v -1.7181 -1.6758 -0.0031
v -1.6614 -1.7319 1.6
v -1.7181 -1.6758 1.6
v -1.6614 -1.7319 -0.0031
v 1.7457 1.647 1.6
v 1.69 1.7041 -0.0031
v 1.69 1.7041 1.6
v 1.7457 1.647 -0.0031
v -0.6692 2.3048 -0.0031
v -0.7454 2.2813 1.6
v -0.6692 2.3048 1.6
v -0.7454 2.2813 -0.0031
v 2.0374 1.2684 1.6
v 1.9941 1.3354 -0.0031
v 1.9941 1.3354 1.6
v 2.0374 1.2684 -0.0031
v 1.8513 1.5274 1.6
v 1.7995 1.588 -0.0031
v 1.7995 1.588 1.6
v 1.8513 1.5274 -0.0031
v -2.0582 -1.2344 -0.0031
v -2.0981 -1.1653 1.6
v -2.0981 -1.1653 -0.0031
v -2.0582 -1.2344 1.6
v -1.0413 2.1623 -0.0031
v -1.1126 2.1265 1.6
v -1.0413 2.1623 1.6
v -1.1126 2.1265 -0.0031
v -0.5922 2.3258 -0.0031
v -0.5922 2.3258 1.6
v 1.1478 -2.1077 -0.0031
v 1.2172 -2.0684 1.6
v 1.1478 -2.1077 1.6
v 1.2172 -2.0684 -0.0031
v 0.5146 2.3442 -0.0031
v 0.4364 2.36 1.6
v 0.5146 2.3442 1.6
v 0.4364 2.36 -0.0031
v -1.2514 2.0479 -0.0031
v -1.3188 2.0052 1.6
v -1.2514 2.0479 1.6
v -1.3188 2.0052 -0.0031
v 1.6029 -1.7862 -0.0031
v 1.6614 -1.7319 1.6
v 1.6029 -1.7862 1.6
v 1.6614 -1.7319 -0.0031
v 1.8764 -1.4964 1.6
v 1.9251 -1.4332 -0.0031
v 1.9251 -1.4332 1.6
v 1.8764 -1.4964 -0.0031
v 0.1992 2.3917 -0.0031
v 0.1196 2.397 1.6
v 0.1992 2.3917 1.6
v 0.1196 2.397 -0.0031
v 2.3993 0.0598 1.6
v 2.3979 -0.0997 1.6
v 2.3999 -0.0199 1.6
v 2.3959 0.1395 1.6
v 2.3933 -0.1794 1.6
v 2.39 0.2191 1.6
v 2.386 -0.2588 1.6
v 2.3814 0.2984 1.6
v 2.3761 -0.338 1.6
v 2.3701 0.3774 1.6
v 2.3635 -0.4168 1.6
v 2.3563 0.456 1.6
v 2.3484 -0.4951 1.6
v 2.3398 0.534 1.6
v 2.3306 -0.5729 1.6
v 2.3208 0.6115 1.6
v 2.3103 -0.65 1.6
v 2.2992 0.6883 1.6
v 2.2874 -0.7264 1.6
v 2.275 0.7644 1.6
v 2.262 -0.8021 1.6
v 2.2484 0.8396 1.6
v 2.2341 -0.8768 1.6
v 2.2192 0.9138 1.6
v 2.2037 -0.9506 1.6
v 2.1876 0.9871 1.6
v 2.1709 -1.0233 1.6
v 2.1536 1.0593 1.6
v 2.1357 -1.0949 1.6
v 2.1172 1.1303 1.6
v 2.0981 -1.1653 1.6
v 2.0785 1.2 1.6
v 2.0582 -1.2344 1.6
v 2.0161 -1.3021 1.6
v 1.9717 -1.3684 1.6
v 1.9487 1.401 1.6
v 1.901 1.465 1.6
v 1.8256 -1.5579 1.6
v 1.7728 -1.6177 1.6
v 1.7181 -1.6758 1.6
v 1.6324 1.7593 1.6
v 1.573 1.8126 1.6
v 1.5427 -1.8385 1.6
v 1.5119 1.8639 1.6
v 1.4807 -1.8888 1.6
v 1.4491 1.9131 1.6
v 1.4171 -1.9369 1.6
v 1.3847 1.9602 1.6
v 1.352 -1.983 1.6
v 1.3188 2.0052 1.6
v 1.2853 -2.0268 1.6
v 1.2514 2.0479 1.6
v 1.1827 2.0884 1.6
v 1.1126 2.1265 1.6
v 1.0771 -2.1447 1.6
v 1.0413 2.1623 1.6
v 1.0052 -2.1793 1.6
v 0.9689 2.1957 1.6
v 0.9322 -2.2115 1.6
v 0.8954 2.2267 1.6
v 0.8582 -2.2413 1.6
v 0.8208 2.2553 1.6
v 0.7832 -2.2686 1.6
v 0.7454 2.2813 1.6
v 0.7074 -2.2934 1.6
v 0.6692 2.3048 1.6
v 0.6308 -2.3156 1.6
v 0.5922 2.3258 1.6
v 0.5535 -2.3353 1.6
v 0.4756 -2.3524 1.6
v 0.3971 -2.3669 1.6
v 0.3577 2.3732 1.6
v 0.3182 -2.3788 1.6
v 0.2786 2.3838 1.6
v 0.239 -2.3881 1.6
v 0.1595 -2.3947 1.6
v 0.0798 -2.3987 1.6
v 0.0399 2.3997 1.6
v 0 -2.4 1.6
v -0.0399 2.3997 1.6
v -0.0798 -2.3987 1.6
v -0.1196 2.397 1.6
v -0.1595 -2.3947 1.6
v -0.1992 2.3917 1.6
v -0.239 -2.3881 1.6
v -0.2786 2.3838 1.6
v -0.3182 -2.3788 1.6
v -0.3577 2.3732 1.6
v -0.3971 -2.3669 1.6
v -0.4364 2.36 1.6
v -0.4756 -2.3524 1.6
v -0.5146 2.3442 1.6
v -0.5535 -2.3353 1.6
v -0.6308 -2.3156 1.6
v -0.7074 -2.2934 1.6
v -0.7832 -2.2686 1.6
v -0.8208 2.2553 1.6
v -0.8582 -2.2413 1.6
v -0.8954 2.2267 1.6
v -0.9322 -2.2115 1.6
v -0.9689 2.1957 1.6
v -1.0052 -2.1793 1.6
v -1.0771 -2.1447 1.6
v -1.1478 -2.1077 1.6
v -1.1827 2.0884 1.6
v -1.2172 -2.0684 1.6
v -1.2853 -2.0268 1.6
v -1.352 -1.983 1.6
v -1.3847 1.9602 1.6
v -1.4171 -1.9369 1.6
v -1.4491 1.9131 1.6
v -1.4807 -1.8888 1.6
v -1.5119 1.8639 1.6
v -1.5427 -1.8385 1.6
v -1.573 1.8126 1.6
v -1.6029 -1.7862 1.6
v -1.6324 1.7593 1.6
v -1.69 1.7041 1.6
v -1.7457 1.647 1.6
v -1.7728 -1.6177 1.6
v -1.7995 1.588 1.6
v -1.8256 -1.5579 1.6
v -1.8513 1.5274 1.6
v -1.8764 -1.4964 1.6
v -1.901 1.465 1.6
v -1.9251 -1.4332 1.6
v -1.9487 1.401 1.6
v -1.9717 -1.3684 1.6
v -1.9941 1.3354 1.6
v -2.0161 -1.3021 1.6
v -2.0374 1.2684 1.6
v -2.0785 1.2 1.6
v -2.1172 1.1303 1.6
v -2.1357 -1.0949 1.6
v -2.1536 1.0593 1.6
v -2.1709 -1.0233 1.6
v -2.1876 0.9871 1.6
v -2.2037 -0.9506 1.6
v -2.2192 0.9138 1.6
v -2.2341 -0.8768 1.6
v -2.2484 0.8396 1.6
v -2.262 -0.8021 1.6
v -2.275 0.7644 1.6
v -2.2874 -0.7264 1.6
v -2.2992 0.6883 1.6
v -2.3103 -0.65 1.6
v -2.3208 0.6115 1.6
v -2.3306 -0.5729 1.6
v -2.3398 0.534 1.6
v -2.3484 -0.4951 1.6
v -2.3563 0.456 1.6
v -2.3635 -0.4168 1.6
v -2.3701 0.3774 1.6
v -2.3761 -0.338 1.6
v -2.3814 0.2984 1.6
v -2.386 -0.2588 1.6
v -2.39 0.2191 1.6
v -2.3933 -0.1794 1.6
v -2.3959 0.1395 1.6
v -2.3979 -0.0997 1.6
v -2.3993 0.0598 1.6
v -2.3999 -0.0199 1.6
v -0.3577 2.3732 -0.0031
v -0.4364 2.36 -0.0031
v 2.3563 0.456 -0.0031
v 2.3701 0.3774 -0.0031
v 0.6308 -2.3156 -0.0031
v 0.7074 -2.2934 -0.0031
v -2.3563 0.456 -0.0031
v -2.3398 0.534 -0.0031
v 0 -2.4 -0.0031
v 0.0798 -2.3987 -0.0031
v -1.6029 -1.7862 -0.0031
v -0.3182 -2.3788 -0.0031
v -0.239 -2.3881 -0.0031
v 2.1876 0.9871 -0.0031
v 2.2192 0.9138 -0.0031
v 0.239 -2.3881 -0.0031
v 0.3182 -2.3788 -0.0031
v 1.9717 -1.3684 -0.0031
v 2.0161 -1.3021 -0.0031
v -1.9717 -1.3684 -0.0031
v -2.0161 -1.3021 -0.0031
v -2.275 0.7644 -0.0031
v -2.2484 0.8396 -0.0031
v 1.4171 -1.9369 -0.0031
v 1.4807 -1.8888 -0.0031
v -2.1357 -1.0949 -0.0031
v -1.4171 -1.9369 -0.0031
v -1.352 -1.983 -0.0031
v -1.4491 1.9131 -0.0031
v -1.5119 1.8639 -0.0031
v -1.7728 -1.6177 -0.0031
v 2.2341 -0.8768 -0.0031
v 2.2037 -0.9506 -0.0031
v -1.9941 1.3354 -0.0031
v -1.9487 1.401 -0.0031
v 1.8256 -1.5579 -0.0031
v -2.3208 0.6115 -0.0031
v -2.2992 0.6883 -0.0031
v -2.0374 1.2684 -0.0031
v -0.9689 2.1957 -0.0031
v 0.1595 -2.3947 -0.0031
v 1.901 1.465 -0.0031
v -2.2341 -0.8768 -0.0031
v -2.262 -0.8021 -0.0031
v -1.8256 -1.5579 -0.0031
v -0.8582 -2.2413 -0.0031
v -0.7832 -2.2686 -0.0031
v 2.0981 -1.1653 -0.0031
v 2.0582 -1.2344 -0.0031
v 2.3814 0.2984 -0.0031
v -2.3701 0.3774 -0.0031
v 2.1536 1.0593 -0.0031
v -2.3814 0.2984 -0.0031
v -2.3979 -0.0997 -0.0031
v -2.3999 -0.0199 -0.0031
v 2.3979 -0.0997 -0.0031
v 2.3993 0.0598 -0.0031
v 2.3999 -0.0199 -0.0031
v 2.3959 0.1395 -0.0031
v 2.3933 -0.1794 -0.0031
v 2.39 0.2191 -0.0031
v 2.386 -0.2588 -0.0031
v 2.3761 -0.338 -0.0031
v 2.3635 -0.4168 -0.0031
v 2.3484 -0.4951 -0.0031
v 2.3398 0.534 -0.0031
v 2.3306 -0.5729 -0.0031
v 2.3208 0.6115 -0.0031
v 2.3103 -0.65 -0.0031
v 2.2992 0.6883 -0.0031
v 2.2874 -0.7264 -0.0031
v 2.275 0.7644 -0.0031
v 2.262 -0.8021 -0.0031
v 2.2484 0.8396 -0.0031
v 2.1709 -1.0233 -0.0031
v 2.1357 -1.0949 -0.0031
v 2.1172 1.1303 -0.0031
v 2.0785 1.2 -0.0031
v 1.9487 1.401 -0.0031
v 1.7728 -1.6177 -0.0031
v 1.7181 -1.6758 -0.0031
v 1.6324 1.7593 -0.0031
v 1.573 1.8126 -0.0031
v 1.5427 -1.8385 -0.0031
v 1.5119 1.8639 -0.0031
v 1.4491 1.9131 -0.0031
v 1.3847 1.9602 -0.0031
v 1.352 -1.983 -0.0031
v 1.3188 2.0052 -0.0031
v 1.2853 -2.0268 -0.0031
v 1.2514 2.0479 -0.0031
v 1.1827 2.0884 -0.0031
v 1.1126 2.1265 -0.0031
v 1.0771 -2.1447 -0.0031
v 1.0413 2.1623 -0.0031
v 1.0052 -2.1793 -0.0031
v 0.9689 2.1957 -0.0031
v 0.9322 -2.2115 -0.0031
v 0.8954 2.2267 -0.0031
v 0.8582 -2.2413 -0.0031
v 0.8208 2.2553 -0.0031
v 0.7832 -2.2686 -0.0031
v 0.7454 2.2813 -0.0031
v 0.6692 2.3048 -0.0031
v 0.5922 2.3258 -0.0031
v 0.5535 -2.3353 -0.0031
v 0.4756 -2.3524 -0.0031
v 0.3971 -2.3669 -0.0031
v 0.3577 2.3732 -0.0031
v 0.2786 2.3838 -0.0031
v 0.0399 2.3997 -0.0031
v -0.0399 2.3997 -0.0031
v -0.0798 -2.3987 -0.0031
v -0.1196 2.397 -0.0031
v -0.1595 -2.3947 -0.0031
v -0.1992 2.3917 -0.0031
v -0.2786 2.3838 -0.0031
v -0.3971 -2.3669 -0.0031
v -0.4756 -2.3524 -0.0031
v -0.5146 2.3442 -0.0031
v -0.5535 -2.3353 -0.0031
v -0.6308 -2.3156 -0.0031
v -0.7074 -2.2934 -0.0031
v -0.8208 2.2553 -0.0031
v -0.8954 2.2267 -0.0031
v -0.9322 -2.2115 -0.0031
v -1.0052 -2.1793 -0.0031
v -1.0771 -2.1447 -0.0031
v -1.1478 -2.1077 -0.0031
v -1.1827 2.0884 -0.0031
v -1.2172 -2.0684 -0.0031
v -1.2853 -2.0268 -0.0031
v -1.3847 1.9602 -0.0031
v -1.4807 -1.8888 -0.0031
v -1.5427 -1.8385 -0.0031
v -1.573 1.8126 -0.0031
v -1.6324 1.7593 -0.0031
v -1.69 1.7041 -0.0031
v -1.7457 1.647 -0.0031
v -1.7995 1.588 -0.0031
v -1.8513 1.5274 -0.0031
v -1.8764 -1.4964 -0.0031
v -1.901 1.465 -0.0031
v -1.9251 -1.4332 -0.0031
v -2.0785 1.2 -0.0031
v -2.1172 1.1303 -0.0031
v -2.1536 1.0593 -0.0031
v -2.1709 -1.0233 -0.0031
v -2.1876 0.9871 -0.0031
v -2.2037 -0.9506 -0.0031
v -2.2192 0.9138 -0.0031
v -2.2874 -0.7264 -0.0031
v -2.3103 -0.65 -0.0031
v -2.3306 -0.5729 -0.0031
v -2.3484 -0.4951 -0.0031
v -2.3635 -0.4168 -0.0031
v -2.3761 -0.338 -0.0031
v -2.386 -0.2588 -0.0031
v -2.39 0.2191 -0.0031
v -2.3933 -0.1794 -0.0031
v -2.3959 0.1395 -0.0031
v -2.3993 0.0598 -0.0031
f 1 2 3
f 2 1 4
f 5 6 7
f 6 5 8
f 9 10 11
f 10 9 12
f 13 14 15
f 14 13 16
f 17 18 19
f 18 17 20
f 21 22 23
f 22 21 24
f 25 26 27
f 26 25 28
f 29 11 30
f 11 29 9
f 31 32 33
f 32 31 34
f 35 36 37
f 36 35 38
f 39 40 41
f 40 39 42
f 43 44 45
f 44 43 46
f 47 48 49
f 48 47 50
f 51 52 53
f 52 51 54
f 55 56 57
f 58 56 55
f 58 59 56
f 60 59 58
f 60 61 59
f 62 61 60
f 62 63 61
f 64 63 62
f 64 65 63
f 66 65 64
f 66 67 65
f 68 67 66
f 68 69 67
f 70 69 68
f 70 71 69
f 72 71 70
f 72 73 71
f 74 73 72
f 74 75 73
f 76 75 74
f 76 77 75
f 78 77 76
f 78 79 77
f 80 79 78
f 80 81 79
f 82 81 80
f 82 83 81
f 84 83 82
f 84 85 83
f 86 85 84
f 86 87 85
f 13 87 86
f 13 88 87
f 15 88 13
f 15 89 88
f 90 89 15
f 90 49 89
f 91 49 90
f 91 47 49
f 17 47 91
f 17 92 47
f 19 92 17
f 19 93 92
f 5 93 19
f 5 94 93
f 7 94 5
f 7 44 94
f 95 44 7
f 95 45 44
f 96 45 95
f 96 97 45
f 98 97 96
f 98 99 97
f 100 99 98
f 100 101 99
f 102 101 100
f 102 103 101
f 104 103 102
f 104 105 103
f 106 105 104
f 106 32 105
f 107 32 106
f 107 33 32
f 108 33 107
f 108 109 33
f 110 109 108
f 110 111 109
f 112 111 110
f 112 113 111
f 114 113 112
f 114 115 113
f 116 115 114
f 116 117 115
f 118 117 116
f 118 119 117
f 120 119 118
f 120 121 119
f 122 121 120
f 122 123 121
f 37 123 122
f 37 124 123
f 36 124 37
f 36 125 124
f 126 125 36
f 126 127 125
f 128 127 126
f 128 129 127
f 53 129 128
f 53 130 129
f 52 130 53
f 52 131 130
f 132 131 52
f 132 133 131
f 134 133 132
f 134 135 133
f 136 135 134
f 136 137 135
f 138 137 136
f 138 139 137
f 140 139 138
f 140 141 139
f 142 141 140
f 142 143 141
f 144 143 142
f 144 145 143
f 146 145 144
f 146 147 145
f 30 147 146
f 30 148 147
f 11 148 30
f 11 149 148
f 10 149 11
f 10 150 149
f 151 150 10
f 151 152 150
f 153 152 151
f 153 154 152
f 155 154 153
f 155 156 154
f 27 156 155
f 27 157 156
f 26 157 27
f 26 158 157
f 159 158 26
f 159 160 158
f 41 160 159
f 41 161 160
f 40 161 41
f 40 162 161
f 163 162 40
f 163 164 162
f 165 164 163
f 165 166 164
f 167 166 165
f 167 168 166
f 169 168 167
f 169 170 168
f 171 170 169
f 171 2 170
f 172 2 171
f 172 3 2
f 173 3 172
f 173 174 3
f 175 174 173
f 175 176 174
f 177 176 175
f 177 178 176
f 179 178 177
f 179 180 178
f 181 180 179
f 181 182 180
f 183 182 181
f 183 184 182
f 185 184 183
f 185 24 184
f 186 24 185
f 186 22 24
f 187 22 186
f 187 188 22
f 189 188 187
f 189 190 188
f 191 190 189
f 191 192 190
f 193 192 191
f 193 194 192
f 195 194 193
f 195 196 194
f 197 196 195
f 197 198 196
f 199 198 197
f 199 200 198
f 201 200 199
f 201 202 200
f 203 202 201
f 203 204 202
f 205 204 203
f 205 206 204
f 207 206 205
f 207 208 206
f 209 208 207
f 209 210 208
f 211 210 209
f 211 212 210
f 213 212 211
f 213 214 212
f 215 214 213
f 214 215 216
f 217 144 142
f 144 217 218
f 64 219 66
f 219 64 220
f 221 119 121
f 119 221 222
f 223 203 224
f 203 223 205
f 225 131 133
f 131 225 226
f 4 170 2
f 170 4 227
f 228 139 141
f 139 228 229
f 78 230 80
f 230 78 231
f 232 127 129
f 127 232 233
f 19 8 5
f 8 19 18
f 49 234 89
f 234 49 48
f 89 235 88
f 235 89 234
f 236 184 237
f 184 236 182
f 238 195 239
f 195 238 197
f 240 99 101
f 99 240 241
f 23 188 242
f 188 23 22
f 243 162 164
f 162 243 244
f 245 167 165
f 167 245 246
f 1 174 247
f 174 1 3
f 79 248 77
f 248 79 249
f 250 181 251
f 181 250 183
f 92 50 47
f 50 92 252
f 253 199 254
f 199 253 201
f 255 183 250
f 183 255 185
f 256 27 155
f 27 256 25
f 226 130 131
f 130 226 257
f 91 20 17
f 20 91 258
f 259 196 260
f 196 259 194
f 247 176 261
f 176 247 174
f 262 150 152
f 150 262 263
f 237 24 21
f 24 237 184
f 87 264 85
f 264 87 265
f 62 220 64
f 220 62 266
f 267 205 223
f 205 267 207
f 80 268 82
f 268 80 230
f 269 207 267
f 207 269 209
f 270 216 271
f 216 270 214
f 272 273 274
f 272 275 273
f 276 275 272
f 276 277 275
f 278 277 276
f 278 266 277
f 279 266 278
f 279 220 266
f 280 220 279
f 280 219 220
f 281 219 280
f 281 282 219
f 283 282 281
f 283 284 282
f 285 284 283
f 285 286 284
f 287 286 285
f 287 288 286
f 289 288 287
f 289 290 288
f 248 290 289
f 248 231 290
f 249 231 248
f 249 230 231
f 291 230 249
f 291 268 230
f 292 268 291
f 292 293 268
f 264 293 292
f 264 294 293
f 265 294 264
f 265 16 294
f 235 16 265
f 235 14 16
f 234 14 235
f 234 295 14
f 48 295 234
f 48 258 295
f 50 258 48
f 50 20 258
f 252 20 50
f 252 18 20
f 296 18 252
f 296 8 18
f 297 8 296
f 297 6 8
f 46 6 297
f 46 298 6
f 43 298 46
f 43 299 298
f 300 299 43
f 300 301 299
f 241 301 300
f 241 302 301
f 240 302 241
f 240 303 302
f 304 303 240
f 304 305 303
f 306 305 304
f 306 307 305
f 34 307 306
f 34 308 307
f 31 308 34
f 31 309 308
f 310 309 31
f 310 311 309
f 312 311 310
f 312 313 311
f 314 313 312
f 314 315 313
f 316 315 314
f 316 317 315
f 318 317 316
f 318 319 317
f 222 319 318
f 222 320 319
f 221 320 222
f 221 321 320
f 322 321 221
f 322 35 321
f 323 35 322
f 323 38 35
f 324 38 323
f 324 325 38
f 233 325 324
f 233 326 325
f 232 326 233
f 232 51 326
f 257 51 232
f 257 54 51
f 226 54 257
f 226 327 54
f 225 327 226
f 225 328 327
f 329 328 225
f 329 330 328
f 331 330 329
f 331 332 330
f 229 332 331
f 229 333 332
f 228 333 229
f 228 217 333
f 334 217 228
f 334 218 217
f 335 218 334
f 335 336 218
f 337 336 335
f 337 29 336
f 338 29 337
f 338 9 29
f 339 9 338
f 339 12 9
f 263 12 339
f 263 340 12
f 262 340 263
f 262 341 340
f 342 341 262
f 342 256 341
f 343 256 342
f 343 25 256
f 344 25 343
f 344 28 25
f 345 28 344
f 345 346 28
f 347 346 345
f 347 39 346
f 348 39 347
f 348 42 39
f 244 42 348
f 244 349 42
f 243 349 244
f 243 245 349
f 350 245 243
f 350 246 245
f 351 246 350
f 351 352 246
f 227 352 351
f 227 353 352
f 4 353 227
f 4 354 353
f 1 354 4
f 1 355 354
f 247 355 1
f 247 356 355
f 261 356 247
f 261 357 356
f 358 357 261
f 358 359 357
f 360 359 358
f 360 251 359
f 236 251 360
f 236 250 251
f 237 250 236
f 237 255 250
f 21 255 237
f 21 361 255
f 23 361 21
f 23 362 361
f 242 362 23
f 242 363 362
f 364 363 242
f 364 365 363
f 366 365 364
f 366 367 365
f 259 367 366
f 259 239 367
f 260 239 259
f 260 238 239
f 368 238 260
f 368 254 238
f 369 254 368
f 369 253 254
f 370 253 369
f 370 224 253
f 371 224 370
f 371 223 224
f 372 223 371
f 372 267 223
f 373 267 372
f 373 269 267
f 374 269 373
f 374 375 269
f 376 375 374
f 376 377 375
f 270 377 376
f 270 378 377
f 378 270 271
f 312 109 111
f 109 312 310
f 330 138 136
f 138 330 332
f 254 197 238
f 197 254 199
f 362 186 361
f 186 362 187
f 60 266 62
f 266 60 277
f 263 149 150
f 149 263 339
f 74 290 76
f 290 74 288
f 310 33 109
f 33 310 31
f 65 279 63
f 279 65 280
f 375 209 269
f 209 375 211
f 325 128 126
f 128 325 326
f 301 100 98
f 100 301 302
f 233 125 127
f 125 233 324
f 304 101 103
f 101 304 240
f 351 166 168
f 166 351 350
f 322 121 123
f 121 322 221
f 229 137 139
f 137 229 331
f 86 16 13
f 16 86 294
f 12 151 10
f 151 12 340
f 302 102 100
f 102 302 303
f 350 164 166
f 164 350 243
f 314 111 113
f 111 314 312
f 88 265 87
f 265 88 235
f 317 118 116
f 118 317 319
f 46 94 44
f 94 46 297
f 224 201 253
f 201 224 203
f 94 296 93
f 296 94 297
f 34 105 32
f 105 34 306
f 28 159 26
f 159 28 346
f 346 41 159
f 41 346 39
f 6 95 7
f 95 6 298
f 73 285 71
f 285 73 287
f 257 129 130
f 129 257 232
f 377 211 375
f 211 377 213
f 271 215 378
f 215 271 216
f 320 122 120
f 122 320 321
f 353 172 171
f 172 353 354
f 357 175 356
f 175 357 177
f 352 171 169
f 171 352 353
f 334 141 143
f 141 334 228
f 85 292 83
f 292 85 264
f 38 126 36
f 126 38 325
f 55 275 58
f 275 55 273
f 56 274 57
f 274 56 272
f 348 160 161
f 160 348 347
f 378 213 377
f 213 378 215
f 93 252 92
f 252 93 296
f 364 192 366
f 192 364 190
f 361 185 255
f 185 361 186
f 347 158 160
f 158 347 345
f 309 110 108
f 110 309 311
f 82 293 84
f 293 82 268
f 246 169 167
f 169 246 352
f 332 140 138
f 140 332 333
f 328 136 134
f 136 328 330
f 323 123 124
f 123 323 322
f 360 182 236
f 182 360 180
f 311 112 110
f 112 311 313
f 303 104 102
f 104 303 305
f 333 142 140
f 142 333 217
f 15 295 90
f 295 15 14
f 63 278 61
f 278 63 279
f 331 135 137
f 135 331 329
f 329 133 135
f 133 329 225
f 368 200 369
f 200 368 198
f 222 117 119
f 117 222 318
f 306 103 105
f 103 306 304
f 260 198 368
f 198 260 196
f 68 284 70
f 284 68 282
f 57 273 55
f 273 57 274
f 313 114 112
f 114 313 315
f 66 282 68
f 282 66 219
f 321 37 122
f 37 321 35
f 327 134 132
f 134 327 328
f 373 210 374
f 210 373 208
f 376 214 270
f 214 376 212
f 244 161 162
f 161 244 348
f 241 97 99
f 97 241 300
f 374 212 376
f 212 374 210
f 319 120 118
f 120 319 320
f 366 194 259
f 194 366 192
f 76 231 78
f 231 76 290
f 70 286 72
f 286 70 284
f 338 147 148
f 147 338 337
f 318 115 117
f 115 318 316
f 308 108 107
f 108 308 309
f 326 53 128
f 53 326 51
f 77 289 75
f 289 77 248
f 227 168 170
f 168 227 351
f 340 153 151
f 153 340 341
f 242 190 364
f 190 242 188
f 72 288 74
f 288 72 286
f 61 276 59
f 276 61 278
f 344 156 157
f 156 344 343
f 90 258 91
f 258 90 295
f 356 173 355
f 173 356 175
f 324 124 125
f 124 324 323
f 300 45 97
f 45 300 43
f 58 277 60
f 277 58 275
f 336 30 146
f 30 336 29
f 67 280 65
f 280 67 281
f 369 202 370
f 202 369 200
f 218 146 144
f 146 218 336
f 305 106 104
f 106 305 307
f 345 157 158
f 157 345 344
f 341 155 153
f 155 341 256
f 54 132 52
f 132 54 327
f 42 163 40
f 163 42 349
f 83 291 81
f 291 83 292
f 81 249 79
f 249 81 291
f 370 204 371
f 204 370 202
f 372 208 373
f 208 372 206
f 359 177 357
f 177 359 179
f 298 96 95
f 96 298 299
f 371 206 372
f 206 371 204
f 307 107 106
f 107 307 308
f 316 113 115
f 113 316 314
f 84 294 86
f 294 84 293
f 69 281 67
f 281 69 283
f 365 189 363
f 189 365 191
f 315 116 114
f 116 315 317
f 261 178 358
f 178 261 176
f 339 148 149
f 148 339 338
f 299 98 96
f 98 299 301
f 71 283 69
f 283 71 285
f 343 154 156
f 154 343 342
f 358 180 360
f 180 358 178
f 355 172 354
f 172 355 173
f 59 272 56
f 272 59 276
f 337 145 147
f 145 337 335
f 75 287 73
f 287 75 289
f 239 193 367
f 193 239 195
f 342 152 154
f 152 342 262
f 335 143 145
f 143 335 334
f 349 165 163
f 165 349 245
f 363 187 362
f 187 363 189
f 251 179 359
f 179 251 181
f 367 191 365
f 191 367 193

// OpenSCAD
use <../lib.scad>
use <3045.scad>
use <6124787b.scad>
$fa=1; $fs=0.2;
function ldraw_lib__3045dx1(realsolid=false) = [
// 0 Slope Brick 45  2 x  2 Double Convex with Medium Azure and White Keypad and Black Vents Sticker
// 0 Name: 3045dx1.dat
// 0 Author: Evert-Jan Boer [ejboer]
// 0 !LDRAW_ORG Shortcut UPDATE 2022-03
// 0 !LICENSE Licensed under CC BY 2.0 and CC BY 4.0 : see CAreadme.txt
// 
// 0 BFC CERTIFY CCW
  [0,"BFC","CERTIFY"],
  [0,"BFC","CCW"],
// 
// 0 !KEYWORDS Bricklink 3045pb04, Dimensions, Set 71200
// 
// 0 !HISTORY 2022-05-07 [PTadmin] Official Update 2022-03
// 
// 
// 1 16 0 0 0 1 0 0 0 1 0 0 0 1 3045.dat
  [1,16,0,0,0,1,0,0,0,1,0,0,0,1, ldraw_lib__3045(realsolid)],
// 1 71 19.988 9.988 -8.5 0 -0.707 -0.707 0 0.707 -0.707 1 0 0 6124787b.dat
  [1,71,19.988,9.988,-8.5,0,-0.707,-0.707,0,0.707,-0.707,1,0,0, ldraw_lib__6124787b(realsolid)],
];
module ldraw_lib__3045dx1(step=0, col=false, unit=2/5, alt=false, line=0.2, solid=!$preview)
    makepoly(ldraw_lib__3045dx1(solid), step=step, col=col, unit=unit, alt=alt, line=line, solid=solid);
ldraw_lib__3045dx1(line=0.2);
